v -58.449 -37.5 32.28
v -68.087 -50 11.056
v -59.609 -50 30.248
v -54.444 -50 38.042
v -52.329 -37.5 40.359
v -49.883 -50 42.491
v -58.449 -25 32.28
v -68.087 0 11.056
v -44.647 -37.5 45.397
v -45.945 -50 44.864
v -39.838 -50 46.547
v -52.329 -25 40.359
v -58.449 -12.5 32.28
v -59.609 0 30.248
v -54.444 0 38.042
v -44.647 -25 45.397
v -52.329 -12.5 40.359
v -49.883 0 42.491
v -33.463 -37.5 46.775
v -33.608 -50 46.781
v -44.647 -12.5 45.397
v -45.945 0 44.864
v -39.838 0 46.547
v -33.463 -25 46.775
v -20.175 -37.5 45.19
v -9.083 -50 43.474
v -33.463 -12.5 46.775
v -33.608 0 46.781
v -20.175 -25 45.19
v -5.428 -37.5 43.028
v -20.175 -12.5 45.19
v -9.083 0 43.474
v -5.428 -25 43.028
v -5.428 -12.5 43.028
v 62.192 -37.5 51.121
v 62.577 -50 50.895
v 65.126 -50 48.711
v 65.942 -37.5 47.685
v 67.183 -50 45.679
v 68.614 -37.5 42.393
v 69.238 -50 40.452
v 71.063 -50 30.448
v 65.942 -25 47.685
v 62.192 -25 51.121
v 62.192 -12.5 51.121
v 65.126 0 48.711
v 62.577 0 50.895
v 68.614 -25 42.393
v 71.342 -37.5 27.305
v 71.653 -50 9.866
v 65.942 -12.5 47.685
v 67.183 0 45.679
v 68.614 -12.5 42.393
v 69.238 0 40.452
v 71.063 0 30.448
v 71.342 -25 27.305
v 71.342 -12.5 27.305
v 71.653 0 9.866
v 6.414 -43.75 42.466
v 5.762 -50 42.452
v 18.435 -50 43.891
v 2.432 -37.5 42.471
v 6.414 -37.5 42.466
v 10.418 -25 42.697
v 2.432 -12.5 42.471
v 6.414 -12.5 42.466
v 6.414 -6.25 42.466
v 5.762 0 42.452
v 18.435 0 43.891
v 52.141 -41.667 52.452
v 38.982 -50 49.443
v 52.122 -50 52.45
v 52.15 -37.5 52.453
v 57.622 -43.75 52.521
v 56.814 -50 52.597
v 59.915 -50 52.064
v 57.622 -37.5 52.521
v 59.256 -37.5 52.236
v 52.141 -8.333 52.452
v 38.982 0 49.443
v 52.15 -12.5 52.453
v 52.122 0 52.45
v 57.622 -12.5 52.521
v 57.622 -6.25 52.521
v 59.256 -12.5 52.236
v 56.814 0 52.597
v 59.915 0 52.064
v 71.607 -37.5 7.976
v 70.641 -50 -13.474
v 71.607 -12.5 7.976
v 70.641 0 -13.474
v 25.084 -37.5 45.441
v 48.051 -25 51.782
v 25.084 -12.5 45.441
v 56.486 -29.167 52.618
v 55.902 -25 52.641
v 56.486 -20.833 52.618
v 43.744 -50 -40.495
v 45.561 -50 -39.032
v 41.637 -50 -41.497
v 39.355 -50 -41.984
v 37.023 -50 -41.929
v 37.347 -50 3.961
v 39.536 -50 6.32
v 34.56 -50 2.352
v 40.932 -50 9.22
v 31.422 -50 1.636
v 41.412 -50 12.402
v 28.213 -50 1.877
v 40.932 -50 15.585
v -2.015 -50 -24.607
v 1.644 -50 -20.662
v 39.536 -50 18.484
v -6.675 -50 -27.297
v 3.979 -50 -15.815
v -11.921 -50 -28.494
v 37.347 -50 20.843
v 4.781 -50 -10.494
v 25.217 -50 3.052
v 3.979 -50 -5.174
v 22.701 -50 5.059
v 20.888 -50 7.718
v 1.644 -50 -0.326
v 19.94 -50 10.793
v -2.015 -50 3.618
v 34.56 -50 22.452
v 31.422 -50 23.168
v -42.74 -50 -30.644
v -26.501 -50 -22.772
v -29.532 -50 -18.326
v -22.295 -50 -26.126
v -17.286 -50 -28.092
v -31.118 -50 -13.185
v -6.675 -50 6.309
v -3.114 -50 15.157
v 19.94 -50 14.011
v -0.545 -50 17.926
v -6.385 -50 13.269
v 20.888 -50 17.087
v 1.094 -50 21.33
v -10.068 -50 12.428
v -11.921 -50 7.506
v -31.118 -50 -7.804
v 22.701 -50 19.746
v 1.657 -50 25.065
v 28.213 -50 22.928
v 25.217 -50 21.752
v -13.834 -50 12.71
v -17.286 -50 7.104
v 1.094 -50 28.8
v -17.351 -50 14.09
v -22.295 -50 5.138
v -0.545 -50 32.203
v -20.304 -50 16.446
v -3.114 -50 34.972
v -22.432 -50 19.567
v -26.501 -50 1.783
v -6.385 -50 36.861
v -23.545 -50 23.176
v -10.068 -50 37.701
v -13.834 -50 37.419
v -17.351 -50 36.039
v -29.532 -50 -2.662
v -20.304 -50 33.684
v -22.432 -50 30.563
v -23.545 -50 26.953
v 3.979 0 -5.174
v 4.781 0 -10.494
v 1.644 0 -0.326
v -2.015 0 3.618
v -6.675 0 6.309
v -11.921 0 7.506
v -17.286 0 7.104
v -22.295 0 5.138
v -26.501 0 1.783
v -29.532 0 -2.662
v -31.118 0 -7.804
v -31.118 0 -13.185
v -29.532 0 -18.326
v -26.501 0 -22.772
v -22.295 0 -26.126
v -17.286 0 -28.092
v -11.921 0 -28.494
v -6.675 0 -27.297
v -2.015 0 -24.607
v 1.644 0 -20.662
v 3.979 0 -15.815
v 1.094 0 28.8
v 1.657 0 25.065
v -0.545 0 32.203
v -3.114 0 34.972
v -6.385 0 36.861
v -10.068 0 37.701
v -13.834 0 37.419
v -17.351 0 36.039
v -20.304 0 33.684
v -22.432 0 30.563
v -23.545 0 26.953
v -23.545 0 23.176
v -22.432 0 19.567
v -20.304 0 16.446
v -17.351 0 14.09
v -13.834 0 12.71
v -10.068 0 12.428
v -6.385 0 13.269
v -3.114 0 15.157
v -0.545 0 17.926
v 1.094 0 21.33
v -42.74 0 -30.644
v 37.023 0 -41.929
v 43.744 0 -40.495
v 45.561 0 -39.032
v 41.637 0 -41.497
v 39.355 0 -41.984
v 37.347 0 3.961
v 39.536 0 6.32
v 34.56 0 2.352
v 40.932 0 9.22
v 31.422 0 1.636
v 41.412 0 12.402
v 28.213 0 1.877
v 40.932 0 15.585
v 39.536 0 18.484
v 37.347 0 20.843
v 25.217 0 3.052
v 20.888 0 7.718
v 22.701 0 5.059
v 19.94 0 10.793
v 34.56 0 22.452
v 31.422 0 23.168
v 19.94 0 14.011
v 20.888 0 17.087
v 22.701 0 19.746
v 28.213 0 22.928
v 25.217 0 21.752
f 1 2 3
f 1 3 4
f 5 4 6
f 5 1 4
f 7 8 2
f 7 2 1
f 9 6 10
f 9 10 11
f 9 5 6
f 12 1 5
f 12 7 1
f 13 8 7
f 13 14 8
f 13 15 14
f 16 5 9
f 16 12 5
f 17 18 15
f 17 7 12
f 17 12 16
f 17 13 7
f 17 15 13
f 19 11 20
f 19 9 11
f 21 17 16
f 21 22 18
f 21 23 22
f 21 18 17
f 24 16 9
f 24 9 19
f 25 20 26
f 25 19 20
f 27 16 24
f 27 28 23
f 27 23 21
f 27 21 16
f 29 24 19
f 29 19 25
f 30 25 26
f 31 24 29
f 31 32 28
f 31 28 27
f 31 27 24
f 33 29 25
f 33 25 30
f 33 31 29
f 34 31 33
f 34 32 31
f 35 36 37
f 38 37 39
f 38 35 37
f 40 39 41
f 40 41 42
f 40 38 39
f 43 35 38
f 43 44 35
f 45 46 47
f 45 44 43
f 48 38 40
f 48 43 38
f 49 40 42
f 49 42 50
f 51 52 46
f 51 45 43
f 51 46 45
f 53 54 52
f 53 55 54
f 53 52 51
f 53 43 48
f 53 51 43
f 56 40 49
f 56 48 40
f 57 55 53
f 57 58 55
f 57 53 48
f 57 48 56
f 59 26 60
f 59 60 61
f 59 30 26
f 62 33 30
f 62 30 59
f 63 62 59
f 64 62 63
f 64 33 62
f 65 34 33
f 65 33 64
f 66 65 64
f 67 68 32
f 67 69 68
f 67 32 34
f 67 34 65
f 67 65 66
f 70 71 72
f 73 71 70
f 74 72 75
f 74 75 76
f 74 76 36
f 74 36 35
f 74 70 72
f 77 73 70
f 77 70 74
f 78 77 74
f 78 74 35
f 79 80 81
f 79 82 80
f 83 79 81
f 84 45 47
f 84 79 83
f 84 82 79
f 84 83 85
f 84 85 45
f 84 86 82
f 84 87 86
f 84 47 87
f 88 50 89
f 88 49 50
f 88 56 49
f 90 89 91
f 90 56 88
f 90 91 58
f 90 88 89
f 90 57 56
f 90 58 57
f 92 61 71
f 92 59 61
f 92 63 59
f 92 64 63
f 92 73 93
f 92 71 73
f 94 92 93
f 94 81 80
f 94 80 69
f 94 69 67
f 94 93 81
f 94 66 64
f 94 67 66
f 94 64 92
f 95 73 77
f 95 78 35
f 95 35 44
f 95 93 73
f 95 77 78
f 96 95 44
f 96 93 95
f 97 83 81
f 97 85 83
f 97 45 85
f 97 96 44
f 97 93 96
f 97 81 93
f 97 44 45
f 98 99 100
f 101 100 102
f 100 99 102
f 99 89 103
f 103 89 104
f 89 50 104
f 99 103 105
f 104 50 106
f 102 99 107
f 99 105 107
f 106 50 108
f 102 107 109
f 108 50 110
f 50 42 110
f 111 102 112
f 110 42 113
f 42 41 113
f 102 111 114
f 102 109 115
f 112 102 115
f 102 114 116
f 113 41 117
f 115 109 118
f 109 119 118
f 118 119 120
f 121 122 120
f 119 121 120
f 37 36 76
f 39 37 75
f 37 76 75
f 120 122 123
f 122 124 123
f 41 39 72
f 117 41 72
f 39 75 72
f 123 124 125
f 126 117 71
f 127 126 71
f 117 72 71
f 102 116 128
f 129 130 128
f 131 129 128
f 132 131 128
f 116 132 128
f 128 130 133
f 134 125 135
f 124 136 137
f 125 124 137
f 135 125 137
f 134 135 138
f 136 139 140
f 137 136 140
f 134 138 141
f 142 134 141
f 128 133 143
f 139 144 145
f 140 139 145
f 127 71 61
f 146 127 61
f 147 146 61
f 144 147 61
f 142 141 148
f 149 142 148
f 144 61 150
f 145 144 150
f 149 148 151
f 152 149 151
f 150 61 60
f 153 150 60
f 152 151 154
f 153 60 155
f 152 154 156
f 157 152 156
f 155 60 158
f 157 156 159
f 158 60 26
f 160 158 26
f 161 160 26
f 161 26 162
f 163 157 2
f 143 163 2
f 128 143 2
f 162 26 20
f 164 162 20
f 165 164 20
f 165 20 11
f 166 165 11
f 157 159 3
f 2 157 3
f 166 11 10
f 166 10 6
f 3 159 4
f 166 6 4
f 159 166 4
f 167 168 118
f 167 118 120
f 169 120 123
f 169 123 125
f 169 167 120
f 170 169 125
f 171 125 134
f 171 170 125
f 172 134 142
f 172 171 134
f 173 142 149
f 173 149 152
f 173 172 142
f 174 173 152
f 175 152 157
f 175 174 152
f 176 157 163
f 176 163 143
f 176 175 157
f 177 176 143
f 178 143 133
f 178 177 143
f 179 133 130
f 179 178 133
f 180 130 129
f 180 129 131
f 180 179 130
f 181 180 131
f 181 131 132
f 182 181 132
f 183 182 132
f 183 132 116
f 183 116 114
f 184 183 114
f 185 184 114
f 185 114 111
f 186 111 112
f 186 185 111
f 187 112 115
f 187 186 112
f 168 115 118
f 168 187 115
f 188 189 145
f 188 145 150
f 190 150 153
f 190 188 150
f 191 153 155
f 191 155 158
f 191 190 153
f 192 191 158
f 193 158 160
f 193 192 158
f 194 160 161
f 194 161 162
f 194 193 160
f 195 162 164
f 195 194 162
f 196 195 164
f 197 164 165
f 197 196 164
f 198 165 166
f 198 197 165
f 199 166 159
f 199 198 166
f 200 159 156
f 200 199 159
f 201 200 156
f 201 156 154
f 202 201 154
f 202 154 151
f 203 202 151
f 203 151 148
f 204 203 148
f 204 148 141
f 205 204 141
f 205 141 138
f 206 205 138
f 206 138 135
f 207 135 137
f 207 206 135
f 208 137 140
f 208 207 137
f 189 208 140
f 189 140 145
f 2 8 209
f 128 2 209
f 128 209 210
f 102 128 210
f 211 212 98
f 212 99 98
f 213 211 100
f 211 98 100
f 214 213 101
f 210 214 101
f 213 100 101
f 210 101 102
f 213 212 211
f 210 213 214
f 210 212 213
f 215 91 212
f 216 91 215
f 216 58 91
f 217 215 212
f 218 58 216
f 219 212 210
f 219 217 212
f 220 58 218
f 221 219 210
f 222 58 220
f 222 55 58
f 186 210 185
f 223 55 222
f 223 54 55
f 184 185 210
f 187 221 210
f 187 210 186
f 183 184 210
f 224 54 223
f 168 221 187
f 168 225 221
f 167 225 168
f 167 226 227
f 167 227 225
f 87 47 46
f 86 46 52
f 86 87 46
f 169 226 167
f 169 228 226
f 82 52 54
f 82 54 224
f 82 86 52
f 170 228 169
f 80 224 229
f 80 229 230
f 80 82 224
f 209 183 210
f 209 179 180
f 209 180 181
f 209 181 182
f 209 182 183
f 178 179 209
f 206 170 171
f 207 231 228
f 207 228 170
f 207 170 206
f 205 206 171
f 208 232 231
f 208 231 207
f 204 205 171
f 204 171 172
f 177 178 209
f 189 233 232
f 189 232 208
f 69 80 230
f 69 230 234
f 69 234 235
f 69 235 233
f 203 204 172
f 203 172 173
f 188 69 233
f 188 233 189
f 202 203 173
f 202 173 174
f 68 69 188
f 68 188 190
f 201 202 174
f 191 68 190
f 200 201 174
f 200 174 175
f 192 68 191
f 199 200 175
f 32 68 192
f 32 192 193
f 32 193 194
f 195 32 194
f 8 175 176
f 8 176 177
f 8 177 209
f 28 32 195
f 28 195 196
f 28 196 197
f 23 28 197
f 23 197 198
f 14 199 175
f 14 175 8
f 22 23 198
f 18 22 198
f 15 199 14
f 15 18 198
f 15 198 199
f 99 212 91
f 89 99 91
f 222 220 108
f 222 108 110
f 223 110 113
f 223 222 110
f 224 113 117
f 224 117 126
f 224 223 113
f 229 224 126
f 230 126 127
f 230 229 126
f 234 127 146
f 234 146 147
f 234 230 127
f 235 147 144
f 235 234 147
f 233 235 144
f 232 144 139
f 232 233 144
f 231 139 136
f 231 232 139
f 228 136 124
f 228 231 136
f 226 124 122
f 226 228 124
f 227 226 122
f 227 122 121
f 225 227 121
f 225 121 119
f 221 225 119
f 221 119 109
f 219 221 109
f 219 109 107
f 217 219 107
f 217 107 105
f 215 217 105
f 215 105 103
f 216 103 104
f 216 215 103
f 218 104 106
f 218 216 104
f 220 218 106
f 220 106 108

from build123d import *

# Parameters (mm, degrees)
F0_R     = 18.050487637
F0_R_2   = 10.7962905291
F0_R_3   = 12.6719479167
F1_DEPTH = 50
F2_R     = 10


with BuildPart() as f1:
    # F0 (on Front) → F1 (new body)
    with BuildSketch(Plane.XZ):
        with BuildLine():
            add(Edge.make_bspline(
                [(-68.0867659093, 11.0560087651), (-62.1241605878, 26.1059229723), (-49.313077038, 58.4417389335), (9.2746440149, 31.6775795029), (75.1691613719, 70.822435211), (72.2027717002, 15.5965229505), (70.6413116541, -13.4735133734)],
                knots=[0, 0, 0, 0, 0.2209195932, 0.4746615304, 0.7234702376, 1, 1, 1, 1], degree=3))
            Line((-68.0867659093, 11.0560087651), (-42.739597179, -30.6441781387))
            Line((-42.739597179, -30.6441781387), (42.023533143, -42.6363915635))
            Line((42.023533143, -42.6363915635), (70.6413116541, -13.4735133734))
        make_face()
        with Locations((-13.269550167, -10.4942182079)):
            Circle(F0_R, mode=Mode.SUBTRACT)
        with Locations((30.61536327, 12.4022578821)):
            Circle(F0_R_2, mode=Mode.SUBTRACT)
        with Locations((-11.0145937651, 25.0647049397)):
            Circle(F0_R_3, mode=Mode.SUBTRACT)
    extrude(amount=F1_DEPTH)

    # F2
    f2_edges = [f1.edges().sort_by_distance(p)[0] for p in [
        (42.023533, -25, -42.636392),
    ]]
    fillet(f2_edges, radius=F2_R)


solid = f1.part
